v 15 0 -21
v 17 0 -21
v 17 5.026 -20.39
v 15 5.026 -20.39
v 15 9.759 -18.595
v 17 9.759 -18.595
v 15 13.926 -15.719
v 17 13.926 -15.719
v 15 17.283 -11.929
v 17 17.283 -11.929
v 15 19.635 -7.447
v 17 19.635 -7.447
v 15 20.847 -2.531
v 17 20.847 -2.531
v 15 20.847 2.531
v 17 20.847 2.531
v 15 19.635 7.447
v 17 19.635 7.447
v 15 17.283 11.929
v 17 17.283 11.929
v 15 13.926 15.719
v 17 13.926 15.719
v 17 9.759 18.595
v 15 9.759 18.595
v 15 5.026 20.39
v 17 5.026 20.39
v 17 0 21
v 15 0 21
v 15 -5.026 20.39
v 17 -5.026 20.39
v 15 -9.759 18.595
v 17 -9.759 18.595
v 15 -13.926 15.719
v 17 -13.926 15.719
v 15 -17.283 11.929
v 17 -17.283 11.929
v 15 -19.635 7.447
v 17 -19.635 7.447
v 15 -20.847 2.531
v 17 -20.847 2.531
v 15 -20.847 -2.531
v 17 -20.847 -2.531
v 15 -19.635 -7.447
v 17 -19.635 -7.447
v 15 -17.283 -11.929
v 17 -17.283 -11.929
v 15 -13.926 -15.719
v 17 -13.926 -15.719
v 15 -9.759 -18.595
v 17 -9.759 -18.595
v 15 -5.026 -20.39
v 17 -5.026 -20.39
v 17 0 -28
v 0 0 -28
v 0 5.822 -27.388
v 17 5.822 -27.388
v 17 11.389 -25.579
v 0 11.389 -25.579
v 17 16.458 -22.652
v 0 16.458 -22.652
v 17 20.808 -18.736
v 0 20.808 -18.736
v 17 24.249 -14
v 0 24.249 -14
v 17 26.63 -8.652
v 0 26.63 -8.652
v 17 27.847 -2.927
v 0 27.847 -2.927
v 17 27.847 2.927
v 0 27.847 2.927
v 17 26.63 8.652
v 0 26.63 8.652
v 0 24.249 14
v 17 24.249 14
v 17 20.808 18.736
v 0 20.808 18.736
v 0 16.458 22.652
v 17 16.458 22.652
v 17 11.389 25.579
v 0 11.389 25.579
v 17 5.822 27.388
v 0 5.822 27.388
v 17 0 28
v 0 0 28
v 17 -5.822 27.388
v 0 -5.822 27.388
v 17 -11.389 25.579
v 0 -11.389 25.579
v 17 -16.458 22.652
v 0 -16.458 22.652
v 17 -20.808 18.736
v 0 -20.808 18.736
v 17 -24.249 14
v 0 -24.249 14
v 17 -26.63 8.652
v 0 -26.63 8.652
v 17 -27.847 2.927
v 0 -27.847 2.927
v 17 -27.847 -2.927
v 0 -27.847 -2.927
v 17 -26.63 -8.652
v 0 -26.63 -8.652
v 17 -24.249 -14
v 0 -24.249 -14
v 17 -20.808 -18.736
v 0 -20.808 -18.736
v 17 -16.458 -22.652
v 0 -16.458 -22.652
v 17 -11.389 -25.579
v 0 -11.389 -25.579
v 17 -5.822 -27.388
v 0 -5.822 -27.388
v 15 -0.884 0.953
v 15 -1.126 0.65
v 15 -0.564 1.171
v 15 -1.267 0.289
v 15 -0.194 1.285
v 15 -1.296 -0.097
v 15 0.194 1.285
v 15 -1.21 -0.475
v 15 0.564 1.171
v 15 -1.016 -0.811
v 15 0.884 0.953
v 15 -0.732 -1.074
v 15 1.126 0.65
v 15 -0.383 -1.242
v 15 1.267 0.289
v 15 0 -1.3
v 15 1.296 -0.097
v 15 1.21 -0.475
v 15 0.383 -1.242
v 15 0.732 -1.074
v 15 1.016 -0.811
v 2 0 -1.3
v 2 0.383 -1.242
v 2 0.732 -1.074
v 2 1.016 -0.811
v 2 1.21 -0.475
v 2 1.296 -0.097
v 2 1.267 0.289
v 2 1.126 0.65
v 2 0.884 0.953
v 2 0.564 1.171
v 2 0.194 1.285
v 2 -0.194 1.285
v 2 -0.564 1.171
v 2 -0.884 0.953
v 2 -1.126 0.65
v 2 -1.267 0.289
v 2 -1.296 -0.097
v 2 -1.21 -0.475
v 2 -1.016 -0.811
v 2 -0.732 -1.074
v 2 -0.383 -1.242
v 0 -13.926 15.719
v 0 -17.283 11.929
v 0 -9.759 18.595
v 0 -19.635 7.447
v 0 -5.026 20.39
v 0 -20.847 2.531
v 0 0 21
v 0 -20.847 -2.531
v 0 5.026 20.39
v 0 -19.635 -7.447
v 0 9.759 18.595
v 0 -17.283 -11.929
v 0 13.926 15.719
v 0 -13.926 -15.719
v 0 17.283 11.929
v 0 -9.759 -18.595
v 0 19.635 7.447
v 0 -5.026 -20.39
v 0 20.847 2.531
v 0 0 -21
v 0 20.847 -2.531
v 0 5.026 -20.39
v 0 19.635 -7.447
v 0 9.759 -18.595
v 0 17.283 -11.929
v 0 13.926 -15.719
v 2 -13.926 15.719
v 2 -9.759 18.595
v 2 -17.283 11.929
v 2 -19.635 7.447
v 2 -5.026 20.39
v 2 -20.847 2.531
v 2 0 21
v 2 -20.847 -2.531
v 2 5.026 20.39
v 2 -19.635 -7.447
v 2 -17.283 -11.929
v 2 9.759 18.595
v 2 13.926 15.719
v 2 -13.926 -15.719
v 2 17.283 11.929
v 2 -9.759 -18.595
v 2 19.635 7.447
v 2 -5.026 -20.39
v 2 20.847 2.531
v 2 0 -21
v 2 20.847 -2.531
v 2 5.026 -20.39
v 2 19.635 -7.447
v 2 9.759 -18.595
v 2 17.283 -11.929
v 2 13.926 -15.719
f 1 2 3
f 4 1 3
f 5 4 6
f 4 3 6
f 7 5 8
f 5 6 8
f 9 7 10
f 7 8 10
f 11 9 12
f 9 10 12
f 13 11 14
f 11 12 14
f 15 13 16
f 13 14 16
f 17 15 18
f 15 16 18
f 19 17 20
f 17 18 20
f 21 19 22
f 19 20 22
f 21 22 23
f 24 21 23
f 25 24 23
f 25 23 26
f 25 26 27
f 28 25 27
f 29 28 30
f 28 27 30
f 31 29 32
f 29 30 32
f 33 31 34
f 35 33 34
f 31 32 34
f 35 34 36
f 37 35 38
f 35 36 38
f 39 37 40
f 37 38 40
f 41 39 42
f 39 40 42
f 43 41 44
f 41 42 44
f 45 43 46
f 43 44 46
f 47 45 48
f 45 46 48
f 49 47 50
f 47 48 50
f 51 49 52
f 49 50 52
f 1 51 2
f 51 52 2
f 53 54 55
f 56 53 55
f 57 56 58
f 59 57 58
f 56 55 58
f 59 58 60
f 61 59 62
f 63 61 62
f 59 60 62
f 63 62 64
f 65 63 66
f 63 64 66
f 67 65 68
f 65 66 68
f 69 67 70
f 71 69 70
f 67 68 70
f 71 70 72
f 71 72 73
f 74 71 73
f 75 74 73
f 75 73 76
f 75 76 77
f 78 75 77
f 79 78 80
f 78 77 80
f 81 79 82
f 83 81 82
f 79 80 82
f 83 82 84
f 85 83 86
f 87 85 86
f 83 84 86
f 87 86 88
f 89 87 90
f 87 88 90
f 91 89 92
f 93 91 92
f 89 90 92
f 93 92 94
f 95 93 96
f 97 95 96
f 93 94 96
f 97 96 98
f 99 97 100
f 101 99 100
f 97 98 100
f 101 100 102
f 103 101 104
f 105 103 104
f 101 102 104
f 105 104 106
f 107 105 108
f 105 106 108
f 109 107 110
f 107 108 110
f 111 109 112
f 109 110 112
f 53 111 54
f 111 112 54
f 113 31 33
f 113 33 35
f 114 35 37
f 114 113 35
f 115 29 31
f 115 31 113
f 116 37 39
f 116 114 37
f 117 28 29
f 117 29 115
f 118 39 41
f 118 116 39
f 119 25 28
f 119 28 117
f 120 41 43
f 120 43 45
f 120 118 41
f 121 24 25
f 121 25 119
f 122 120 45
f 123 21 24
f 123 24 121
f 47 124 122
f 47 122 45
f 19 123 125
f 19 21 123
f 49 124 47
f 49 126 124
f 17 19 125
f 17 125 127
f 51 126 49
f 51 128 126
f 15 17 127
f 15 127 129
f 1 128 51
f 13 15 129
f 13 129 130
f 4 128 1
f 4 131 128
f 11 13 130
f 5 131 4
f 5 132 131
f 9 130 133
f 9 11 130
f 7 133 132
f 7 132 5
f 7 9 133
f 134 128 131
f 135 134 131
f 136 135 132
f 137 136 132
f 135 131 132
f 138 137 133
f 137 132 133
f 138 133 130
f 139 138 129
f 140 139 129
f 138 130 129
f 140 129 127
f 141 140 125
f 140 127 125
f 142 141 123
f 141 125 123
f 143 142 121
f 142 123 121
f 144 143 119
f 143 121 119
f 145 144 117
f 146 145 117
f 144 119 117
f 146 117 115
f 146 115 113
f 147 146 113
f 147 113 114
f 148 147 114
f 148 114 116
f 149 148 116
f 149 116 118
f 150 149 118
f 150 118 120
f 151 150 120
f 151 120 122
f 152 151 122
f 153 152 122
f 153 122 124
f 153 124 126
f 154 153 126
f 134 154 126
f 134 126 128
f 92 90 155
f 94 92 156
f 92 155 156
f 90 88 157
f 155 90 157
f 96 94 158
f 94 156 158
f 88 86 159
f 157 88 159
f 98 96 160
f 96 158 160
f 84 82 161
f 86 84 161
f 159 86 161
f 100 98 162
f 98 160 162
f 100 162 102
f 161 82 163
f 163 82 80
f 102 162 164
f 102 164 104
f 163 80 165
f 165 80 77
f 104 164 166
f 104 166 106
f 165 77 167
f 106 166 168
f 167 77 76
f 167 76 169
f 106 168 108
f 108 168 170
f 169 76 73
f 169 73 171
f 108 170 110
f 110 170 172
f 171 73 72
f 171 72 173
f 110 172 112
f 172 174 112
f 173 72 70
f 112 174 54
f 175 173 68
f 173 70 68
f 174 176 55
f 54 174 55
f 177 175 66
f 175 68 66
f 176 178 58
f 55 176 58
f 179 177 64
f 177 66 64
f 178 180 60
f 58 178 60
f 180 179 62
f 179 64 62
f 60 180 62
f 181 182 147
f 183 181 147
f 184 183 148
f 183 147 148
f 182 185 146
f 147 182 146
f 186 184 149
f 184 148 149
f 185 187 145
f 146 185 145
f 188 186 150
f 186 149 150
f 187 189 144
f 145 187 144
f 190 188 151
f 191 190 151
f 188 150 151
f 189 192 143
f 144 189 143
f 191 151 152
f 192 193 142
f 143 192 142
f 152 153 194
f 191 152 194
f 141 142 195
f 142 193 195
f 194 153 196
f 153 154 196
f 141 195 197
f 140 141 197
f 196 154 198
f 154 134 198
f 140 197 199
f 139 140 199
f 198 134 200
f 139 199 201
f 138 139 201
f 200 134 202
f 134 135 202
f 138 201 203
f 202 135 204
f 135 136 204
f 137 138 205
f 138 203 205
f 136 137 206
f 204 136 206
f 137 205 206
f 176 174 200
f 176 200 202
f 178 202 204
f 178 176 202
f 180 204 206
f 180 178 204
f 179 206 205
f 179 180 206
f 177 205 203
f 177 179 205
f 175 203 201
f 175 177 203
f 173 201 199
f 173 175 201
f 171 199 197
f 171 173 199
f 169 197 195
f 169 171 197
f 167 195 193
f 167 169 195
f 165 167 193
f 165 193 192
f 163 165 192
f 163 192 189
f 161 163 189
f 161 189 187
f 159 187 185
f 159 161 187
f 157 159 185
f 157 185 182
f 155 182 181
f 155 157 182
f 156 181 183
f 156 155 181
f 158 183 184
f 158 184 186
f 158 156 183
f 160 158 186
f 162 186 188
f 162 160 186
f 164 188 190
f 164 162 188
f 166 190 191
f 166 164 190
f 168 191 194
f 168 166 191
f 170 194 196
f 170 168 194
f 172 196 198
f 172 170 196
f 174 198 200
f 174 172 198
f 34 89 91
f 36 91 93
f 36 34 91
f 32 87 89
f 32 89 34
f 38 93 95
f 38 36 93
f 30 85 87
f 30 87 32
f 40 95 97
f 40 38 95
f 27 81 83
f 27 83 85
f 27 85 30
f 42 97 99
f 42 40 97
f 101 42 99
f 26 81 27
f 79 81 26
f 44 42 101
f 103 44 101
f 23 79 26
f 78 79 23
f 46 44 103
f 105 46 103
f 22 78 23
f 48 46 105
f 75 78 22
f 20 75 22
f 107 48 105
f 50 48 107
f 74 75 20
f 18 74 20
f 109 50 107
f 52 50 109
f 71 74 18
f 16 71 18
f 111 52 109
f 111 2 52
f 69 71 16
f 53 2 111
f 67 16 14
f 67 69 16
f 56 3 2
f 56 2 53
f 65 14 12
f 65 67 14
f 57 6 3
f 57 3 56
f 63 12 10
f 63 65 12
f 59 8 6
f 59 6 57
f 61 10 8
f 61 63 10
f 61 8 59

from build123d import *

# Parameters (mm, degrees)
ESQUISSE1_R             = 28
BOSS_EXTRU_1_DEPTH      = 17
ESQUISSE2_R             = 1.3
ENL_V_MAT_EXTRU_1_DEPTH = 17
ESQUISSE3_R             = 21
ENL_V_MAT_EXTRU_2_DEPTH = 2


with BuildPart() as part:
    # Esquisse1 → Boss.-Extru.1 (new body)
    with BuildSketch(Plane(origin=(0, 0, 0), x_dir=(0, 0, -1), z_dir=(1, 0, 0))):
        Circle(ESQUISSE1_R)
    extrude(amount=BOSS_EXTRU_1_DEPTH)

    # Esquisse2 → Enlèv. mat.-Extru.1 (cut)
    with BuildSketch(Plane(origin=(17, 0, 0), x_dir=(0, 0, -1), z_dir=(1, 0, 0))):
        Circle(ESQUISSE2_R)
    extrude(amount=-ENL_V_MAT_EXTRU_1_DEPTH, mode=Mode.SUBTRACT)

    # Esquisse3 → Enlèv. mat.-Extru.2 (cut)
    with BuildSketch(Plane(origin=(17, 0, 0), x_dir=(0, 0, -1), z_dir=(1, 0, 0))):
        Circle(ESQUISSE3_R)
    enl_v_mat_extru_2 = extrude(amount=-ENL_V_MAT_EXTRU_2_DEPTH, mode=Mode.SUBTRACT)

    # Symétrie1: Enlèv. mat.-Extru.2 across plane
    add(enl_v_mat_extru_2.mirror(Plane(origin=(8.5, 0, 0), x_dir=(0, 0, 1), z_dir=(1, 0, 0))), mode=Mode.SUBTRACT)


solid = part.part
